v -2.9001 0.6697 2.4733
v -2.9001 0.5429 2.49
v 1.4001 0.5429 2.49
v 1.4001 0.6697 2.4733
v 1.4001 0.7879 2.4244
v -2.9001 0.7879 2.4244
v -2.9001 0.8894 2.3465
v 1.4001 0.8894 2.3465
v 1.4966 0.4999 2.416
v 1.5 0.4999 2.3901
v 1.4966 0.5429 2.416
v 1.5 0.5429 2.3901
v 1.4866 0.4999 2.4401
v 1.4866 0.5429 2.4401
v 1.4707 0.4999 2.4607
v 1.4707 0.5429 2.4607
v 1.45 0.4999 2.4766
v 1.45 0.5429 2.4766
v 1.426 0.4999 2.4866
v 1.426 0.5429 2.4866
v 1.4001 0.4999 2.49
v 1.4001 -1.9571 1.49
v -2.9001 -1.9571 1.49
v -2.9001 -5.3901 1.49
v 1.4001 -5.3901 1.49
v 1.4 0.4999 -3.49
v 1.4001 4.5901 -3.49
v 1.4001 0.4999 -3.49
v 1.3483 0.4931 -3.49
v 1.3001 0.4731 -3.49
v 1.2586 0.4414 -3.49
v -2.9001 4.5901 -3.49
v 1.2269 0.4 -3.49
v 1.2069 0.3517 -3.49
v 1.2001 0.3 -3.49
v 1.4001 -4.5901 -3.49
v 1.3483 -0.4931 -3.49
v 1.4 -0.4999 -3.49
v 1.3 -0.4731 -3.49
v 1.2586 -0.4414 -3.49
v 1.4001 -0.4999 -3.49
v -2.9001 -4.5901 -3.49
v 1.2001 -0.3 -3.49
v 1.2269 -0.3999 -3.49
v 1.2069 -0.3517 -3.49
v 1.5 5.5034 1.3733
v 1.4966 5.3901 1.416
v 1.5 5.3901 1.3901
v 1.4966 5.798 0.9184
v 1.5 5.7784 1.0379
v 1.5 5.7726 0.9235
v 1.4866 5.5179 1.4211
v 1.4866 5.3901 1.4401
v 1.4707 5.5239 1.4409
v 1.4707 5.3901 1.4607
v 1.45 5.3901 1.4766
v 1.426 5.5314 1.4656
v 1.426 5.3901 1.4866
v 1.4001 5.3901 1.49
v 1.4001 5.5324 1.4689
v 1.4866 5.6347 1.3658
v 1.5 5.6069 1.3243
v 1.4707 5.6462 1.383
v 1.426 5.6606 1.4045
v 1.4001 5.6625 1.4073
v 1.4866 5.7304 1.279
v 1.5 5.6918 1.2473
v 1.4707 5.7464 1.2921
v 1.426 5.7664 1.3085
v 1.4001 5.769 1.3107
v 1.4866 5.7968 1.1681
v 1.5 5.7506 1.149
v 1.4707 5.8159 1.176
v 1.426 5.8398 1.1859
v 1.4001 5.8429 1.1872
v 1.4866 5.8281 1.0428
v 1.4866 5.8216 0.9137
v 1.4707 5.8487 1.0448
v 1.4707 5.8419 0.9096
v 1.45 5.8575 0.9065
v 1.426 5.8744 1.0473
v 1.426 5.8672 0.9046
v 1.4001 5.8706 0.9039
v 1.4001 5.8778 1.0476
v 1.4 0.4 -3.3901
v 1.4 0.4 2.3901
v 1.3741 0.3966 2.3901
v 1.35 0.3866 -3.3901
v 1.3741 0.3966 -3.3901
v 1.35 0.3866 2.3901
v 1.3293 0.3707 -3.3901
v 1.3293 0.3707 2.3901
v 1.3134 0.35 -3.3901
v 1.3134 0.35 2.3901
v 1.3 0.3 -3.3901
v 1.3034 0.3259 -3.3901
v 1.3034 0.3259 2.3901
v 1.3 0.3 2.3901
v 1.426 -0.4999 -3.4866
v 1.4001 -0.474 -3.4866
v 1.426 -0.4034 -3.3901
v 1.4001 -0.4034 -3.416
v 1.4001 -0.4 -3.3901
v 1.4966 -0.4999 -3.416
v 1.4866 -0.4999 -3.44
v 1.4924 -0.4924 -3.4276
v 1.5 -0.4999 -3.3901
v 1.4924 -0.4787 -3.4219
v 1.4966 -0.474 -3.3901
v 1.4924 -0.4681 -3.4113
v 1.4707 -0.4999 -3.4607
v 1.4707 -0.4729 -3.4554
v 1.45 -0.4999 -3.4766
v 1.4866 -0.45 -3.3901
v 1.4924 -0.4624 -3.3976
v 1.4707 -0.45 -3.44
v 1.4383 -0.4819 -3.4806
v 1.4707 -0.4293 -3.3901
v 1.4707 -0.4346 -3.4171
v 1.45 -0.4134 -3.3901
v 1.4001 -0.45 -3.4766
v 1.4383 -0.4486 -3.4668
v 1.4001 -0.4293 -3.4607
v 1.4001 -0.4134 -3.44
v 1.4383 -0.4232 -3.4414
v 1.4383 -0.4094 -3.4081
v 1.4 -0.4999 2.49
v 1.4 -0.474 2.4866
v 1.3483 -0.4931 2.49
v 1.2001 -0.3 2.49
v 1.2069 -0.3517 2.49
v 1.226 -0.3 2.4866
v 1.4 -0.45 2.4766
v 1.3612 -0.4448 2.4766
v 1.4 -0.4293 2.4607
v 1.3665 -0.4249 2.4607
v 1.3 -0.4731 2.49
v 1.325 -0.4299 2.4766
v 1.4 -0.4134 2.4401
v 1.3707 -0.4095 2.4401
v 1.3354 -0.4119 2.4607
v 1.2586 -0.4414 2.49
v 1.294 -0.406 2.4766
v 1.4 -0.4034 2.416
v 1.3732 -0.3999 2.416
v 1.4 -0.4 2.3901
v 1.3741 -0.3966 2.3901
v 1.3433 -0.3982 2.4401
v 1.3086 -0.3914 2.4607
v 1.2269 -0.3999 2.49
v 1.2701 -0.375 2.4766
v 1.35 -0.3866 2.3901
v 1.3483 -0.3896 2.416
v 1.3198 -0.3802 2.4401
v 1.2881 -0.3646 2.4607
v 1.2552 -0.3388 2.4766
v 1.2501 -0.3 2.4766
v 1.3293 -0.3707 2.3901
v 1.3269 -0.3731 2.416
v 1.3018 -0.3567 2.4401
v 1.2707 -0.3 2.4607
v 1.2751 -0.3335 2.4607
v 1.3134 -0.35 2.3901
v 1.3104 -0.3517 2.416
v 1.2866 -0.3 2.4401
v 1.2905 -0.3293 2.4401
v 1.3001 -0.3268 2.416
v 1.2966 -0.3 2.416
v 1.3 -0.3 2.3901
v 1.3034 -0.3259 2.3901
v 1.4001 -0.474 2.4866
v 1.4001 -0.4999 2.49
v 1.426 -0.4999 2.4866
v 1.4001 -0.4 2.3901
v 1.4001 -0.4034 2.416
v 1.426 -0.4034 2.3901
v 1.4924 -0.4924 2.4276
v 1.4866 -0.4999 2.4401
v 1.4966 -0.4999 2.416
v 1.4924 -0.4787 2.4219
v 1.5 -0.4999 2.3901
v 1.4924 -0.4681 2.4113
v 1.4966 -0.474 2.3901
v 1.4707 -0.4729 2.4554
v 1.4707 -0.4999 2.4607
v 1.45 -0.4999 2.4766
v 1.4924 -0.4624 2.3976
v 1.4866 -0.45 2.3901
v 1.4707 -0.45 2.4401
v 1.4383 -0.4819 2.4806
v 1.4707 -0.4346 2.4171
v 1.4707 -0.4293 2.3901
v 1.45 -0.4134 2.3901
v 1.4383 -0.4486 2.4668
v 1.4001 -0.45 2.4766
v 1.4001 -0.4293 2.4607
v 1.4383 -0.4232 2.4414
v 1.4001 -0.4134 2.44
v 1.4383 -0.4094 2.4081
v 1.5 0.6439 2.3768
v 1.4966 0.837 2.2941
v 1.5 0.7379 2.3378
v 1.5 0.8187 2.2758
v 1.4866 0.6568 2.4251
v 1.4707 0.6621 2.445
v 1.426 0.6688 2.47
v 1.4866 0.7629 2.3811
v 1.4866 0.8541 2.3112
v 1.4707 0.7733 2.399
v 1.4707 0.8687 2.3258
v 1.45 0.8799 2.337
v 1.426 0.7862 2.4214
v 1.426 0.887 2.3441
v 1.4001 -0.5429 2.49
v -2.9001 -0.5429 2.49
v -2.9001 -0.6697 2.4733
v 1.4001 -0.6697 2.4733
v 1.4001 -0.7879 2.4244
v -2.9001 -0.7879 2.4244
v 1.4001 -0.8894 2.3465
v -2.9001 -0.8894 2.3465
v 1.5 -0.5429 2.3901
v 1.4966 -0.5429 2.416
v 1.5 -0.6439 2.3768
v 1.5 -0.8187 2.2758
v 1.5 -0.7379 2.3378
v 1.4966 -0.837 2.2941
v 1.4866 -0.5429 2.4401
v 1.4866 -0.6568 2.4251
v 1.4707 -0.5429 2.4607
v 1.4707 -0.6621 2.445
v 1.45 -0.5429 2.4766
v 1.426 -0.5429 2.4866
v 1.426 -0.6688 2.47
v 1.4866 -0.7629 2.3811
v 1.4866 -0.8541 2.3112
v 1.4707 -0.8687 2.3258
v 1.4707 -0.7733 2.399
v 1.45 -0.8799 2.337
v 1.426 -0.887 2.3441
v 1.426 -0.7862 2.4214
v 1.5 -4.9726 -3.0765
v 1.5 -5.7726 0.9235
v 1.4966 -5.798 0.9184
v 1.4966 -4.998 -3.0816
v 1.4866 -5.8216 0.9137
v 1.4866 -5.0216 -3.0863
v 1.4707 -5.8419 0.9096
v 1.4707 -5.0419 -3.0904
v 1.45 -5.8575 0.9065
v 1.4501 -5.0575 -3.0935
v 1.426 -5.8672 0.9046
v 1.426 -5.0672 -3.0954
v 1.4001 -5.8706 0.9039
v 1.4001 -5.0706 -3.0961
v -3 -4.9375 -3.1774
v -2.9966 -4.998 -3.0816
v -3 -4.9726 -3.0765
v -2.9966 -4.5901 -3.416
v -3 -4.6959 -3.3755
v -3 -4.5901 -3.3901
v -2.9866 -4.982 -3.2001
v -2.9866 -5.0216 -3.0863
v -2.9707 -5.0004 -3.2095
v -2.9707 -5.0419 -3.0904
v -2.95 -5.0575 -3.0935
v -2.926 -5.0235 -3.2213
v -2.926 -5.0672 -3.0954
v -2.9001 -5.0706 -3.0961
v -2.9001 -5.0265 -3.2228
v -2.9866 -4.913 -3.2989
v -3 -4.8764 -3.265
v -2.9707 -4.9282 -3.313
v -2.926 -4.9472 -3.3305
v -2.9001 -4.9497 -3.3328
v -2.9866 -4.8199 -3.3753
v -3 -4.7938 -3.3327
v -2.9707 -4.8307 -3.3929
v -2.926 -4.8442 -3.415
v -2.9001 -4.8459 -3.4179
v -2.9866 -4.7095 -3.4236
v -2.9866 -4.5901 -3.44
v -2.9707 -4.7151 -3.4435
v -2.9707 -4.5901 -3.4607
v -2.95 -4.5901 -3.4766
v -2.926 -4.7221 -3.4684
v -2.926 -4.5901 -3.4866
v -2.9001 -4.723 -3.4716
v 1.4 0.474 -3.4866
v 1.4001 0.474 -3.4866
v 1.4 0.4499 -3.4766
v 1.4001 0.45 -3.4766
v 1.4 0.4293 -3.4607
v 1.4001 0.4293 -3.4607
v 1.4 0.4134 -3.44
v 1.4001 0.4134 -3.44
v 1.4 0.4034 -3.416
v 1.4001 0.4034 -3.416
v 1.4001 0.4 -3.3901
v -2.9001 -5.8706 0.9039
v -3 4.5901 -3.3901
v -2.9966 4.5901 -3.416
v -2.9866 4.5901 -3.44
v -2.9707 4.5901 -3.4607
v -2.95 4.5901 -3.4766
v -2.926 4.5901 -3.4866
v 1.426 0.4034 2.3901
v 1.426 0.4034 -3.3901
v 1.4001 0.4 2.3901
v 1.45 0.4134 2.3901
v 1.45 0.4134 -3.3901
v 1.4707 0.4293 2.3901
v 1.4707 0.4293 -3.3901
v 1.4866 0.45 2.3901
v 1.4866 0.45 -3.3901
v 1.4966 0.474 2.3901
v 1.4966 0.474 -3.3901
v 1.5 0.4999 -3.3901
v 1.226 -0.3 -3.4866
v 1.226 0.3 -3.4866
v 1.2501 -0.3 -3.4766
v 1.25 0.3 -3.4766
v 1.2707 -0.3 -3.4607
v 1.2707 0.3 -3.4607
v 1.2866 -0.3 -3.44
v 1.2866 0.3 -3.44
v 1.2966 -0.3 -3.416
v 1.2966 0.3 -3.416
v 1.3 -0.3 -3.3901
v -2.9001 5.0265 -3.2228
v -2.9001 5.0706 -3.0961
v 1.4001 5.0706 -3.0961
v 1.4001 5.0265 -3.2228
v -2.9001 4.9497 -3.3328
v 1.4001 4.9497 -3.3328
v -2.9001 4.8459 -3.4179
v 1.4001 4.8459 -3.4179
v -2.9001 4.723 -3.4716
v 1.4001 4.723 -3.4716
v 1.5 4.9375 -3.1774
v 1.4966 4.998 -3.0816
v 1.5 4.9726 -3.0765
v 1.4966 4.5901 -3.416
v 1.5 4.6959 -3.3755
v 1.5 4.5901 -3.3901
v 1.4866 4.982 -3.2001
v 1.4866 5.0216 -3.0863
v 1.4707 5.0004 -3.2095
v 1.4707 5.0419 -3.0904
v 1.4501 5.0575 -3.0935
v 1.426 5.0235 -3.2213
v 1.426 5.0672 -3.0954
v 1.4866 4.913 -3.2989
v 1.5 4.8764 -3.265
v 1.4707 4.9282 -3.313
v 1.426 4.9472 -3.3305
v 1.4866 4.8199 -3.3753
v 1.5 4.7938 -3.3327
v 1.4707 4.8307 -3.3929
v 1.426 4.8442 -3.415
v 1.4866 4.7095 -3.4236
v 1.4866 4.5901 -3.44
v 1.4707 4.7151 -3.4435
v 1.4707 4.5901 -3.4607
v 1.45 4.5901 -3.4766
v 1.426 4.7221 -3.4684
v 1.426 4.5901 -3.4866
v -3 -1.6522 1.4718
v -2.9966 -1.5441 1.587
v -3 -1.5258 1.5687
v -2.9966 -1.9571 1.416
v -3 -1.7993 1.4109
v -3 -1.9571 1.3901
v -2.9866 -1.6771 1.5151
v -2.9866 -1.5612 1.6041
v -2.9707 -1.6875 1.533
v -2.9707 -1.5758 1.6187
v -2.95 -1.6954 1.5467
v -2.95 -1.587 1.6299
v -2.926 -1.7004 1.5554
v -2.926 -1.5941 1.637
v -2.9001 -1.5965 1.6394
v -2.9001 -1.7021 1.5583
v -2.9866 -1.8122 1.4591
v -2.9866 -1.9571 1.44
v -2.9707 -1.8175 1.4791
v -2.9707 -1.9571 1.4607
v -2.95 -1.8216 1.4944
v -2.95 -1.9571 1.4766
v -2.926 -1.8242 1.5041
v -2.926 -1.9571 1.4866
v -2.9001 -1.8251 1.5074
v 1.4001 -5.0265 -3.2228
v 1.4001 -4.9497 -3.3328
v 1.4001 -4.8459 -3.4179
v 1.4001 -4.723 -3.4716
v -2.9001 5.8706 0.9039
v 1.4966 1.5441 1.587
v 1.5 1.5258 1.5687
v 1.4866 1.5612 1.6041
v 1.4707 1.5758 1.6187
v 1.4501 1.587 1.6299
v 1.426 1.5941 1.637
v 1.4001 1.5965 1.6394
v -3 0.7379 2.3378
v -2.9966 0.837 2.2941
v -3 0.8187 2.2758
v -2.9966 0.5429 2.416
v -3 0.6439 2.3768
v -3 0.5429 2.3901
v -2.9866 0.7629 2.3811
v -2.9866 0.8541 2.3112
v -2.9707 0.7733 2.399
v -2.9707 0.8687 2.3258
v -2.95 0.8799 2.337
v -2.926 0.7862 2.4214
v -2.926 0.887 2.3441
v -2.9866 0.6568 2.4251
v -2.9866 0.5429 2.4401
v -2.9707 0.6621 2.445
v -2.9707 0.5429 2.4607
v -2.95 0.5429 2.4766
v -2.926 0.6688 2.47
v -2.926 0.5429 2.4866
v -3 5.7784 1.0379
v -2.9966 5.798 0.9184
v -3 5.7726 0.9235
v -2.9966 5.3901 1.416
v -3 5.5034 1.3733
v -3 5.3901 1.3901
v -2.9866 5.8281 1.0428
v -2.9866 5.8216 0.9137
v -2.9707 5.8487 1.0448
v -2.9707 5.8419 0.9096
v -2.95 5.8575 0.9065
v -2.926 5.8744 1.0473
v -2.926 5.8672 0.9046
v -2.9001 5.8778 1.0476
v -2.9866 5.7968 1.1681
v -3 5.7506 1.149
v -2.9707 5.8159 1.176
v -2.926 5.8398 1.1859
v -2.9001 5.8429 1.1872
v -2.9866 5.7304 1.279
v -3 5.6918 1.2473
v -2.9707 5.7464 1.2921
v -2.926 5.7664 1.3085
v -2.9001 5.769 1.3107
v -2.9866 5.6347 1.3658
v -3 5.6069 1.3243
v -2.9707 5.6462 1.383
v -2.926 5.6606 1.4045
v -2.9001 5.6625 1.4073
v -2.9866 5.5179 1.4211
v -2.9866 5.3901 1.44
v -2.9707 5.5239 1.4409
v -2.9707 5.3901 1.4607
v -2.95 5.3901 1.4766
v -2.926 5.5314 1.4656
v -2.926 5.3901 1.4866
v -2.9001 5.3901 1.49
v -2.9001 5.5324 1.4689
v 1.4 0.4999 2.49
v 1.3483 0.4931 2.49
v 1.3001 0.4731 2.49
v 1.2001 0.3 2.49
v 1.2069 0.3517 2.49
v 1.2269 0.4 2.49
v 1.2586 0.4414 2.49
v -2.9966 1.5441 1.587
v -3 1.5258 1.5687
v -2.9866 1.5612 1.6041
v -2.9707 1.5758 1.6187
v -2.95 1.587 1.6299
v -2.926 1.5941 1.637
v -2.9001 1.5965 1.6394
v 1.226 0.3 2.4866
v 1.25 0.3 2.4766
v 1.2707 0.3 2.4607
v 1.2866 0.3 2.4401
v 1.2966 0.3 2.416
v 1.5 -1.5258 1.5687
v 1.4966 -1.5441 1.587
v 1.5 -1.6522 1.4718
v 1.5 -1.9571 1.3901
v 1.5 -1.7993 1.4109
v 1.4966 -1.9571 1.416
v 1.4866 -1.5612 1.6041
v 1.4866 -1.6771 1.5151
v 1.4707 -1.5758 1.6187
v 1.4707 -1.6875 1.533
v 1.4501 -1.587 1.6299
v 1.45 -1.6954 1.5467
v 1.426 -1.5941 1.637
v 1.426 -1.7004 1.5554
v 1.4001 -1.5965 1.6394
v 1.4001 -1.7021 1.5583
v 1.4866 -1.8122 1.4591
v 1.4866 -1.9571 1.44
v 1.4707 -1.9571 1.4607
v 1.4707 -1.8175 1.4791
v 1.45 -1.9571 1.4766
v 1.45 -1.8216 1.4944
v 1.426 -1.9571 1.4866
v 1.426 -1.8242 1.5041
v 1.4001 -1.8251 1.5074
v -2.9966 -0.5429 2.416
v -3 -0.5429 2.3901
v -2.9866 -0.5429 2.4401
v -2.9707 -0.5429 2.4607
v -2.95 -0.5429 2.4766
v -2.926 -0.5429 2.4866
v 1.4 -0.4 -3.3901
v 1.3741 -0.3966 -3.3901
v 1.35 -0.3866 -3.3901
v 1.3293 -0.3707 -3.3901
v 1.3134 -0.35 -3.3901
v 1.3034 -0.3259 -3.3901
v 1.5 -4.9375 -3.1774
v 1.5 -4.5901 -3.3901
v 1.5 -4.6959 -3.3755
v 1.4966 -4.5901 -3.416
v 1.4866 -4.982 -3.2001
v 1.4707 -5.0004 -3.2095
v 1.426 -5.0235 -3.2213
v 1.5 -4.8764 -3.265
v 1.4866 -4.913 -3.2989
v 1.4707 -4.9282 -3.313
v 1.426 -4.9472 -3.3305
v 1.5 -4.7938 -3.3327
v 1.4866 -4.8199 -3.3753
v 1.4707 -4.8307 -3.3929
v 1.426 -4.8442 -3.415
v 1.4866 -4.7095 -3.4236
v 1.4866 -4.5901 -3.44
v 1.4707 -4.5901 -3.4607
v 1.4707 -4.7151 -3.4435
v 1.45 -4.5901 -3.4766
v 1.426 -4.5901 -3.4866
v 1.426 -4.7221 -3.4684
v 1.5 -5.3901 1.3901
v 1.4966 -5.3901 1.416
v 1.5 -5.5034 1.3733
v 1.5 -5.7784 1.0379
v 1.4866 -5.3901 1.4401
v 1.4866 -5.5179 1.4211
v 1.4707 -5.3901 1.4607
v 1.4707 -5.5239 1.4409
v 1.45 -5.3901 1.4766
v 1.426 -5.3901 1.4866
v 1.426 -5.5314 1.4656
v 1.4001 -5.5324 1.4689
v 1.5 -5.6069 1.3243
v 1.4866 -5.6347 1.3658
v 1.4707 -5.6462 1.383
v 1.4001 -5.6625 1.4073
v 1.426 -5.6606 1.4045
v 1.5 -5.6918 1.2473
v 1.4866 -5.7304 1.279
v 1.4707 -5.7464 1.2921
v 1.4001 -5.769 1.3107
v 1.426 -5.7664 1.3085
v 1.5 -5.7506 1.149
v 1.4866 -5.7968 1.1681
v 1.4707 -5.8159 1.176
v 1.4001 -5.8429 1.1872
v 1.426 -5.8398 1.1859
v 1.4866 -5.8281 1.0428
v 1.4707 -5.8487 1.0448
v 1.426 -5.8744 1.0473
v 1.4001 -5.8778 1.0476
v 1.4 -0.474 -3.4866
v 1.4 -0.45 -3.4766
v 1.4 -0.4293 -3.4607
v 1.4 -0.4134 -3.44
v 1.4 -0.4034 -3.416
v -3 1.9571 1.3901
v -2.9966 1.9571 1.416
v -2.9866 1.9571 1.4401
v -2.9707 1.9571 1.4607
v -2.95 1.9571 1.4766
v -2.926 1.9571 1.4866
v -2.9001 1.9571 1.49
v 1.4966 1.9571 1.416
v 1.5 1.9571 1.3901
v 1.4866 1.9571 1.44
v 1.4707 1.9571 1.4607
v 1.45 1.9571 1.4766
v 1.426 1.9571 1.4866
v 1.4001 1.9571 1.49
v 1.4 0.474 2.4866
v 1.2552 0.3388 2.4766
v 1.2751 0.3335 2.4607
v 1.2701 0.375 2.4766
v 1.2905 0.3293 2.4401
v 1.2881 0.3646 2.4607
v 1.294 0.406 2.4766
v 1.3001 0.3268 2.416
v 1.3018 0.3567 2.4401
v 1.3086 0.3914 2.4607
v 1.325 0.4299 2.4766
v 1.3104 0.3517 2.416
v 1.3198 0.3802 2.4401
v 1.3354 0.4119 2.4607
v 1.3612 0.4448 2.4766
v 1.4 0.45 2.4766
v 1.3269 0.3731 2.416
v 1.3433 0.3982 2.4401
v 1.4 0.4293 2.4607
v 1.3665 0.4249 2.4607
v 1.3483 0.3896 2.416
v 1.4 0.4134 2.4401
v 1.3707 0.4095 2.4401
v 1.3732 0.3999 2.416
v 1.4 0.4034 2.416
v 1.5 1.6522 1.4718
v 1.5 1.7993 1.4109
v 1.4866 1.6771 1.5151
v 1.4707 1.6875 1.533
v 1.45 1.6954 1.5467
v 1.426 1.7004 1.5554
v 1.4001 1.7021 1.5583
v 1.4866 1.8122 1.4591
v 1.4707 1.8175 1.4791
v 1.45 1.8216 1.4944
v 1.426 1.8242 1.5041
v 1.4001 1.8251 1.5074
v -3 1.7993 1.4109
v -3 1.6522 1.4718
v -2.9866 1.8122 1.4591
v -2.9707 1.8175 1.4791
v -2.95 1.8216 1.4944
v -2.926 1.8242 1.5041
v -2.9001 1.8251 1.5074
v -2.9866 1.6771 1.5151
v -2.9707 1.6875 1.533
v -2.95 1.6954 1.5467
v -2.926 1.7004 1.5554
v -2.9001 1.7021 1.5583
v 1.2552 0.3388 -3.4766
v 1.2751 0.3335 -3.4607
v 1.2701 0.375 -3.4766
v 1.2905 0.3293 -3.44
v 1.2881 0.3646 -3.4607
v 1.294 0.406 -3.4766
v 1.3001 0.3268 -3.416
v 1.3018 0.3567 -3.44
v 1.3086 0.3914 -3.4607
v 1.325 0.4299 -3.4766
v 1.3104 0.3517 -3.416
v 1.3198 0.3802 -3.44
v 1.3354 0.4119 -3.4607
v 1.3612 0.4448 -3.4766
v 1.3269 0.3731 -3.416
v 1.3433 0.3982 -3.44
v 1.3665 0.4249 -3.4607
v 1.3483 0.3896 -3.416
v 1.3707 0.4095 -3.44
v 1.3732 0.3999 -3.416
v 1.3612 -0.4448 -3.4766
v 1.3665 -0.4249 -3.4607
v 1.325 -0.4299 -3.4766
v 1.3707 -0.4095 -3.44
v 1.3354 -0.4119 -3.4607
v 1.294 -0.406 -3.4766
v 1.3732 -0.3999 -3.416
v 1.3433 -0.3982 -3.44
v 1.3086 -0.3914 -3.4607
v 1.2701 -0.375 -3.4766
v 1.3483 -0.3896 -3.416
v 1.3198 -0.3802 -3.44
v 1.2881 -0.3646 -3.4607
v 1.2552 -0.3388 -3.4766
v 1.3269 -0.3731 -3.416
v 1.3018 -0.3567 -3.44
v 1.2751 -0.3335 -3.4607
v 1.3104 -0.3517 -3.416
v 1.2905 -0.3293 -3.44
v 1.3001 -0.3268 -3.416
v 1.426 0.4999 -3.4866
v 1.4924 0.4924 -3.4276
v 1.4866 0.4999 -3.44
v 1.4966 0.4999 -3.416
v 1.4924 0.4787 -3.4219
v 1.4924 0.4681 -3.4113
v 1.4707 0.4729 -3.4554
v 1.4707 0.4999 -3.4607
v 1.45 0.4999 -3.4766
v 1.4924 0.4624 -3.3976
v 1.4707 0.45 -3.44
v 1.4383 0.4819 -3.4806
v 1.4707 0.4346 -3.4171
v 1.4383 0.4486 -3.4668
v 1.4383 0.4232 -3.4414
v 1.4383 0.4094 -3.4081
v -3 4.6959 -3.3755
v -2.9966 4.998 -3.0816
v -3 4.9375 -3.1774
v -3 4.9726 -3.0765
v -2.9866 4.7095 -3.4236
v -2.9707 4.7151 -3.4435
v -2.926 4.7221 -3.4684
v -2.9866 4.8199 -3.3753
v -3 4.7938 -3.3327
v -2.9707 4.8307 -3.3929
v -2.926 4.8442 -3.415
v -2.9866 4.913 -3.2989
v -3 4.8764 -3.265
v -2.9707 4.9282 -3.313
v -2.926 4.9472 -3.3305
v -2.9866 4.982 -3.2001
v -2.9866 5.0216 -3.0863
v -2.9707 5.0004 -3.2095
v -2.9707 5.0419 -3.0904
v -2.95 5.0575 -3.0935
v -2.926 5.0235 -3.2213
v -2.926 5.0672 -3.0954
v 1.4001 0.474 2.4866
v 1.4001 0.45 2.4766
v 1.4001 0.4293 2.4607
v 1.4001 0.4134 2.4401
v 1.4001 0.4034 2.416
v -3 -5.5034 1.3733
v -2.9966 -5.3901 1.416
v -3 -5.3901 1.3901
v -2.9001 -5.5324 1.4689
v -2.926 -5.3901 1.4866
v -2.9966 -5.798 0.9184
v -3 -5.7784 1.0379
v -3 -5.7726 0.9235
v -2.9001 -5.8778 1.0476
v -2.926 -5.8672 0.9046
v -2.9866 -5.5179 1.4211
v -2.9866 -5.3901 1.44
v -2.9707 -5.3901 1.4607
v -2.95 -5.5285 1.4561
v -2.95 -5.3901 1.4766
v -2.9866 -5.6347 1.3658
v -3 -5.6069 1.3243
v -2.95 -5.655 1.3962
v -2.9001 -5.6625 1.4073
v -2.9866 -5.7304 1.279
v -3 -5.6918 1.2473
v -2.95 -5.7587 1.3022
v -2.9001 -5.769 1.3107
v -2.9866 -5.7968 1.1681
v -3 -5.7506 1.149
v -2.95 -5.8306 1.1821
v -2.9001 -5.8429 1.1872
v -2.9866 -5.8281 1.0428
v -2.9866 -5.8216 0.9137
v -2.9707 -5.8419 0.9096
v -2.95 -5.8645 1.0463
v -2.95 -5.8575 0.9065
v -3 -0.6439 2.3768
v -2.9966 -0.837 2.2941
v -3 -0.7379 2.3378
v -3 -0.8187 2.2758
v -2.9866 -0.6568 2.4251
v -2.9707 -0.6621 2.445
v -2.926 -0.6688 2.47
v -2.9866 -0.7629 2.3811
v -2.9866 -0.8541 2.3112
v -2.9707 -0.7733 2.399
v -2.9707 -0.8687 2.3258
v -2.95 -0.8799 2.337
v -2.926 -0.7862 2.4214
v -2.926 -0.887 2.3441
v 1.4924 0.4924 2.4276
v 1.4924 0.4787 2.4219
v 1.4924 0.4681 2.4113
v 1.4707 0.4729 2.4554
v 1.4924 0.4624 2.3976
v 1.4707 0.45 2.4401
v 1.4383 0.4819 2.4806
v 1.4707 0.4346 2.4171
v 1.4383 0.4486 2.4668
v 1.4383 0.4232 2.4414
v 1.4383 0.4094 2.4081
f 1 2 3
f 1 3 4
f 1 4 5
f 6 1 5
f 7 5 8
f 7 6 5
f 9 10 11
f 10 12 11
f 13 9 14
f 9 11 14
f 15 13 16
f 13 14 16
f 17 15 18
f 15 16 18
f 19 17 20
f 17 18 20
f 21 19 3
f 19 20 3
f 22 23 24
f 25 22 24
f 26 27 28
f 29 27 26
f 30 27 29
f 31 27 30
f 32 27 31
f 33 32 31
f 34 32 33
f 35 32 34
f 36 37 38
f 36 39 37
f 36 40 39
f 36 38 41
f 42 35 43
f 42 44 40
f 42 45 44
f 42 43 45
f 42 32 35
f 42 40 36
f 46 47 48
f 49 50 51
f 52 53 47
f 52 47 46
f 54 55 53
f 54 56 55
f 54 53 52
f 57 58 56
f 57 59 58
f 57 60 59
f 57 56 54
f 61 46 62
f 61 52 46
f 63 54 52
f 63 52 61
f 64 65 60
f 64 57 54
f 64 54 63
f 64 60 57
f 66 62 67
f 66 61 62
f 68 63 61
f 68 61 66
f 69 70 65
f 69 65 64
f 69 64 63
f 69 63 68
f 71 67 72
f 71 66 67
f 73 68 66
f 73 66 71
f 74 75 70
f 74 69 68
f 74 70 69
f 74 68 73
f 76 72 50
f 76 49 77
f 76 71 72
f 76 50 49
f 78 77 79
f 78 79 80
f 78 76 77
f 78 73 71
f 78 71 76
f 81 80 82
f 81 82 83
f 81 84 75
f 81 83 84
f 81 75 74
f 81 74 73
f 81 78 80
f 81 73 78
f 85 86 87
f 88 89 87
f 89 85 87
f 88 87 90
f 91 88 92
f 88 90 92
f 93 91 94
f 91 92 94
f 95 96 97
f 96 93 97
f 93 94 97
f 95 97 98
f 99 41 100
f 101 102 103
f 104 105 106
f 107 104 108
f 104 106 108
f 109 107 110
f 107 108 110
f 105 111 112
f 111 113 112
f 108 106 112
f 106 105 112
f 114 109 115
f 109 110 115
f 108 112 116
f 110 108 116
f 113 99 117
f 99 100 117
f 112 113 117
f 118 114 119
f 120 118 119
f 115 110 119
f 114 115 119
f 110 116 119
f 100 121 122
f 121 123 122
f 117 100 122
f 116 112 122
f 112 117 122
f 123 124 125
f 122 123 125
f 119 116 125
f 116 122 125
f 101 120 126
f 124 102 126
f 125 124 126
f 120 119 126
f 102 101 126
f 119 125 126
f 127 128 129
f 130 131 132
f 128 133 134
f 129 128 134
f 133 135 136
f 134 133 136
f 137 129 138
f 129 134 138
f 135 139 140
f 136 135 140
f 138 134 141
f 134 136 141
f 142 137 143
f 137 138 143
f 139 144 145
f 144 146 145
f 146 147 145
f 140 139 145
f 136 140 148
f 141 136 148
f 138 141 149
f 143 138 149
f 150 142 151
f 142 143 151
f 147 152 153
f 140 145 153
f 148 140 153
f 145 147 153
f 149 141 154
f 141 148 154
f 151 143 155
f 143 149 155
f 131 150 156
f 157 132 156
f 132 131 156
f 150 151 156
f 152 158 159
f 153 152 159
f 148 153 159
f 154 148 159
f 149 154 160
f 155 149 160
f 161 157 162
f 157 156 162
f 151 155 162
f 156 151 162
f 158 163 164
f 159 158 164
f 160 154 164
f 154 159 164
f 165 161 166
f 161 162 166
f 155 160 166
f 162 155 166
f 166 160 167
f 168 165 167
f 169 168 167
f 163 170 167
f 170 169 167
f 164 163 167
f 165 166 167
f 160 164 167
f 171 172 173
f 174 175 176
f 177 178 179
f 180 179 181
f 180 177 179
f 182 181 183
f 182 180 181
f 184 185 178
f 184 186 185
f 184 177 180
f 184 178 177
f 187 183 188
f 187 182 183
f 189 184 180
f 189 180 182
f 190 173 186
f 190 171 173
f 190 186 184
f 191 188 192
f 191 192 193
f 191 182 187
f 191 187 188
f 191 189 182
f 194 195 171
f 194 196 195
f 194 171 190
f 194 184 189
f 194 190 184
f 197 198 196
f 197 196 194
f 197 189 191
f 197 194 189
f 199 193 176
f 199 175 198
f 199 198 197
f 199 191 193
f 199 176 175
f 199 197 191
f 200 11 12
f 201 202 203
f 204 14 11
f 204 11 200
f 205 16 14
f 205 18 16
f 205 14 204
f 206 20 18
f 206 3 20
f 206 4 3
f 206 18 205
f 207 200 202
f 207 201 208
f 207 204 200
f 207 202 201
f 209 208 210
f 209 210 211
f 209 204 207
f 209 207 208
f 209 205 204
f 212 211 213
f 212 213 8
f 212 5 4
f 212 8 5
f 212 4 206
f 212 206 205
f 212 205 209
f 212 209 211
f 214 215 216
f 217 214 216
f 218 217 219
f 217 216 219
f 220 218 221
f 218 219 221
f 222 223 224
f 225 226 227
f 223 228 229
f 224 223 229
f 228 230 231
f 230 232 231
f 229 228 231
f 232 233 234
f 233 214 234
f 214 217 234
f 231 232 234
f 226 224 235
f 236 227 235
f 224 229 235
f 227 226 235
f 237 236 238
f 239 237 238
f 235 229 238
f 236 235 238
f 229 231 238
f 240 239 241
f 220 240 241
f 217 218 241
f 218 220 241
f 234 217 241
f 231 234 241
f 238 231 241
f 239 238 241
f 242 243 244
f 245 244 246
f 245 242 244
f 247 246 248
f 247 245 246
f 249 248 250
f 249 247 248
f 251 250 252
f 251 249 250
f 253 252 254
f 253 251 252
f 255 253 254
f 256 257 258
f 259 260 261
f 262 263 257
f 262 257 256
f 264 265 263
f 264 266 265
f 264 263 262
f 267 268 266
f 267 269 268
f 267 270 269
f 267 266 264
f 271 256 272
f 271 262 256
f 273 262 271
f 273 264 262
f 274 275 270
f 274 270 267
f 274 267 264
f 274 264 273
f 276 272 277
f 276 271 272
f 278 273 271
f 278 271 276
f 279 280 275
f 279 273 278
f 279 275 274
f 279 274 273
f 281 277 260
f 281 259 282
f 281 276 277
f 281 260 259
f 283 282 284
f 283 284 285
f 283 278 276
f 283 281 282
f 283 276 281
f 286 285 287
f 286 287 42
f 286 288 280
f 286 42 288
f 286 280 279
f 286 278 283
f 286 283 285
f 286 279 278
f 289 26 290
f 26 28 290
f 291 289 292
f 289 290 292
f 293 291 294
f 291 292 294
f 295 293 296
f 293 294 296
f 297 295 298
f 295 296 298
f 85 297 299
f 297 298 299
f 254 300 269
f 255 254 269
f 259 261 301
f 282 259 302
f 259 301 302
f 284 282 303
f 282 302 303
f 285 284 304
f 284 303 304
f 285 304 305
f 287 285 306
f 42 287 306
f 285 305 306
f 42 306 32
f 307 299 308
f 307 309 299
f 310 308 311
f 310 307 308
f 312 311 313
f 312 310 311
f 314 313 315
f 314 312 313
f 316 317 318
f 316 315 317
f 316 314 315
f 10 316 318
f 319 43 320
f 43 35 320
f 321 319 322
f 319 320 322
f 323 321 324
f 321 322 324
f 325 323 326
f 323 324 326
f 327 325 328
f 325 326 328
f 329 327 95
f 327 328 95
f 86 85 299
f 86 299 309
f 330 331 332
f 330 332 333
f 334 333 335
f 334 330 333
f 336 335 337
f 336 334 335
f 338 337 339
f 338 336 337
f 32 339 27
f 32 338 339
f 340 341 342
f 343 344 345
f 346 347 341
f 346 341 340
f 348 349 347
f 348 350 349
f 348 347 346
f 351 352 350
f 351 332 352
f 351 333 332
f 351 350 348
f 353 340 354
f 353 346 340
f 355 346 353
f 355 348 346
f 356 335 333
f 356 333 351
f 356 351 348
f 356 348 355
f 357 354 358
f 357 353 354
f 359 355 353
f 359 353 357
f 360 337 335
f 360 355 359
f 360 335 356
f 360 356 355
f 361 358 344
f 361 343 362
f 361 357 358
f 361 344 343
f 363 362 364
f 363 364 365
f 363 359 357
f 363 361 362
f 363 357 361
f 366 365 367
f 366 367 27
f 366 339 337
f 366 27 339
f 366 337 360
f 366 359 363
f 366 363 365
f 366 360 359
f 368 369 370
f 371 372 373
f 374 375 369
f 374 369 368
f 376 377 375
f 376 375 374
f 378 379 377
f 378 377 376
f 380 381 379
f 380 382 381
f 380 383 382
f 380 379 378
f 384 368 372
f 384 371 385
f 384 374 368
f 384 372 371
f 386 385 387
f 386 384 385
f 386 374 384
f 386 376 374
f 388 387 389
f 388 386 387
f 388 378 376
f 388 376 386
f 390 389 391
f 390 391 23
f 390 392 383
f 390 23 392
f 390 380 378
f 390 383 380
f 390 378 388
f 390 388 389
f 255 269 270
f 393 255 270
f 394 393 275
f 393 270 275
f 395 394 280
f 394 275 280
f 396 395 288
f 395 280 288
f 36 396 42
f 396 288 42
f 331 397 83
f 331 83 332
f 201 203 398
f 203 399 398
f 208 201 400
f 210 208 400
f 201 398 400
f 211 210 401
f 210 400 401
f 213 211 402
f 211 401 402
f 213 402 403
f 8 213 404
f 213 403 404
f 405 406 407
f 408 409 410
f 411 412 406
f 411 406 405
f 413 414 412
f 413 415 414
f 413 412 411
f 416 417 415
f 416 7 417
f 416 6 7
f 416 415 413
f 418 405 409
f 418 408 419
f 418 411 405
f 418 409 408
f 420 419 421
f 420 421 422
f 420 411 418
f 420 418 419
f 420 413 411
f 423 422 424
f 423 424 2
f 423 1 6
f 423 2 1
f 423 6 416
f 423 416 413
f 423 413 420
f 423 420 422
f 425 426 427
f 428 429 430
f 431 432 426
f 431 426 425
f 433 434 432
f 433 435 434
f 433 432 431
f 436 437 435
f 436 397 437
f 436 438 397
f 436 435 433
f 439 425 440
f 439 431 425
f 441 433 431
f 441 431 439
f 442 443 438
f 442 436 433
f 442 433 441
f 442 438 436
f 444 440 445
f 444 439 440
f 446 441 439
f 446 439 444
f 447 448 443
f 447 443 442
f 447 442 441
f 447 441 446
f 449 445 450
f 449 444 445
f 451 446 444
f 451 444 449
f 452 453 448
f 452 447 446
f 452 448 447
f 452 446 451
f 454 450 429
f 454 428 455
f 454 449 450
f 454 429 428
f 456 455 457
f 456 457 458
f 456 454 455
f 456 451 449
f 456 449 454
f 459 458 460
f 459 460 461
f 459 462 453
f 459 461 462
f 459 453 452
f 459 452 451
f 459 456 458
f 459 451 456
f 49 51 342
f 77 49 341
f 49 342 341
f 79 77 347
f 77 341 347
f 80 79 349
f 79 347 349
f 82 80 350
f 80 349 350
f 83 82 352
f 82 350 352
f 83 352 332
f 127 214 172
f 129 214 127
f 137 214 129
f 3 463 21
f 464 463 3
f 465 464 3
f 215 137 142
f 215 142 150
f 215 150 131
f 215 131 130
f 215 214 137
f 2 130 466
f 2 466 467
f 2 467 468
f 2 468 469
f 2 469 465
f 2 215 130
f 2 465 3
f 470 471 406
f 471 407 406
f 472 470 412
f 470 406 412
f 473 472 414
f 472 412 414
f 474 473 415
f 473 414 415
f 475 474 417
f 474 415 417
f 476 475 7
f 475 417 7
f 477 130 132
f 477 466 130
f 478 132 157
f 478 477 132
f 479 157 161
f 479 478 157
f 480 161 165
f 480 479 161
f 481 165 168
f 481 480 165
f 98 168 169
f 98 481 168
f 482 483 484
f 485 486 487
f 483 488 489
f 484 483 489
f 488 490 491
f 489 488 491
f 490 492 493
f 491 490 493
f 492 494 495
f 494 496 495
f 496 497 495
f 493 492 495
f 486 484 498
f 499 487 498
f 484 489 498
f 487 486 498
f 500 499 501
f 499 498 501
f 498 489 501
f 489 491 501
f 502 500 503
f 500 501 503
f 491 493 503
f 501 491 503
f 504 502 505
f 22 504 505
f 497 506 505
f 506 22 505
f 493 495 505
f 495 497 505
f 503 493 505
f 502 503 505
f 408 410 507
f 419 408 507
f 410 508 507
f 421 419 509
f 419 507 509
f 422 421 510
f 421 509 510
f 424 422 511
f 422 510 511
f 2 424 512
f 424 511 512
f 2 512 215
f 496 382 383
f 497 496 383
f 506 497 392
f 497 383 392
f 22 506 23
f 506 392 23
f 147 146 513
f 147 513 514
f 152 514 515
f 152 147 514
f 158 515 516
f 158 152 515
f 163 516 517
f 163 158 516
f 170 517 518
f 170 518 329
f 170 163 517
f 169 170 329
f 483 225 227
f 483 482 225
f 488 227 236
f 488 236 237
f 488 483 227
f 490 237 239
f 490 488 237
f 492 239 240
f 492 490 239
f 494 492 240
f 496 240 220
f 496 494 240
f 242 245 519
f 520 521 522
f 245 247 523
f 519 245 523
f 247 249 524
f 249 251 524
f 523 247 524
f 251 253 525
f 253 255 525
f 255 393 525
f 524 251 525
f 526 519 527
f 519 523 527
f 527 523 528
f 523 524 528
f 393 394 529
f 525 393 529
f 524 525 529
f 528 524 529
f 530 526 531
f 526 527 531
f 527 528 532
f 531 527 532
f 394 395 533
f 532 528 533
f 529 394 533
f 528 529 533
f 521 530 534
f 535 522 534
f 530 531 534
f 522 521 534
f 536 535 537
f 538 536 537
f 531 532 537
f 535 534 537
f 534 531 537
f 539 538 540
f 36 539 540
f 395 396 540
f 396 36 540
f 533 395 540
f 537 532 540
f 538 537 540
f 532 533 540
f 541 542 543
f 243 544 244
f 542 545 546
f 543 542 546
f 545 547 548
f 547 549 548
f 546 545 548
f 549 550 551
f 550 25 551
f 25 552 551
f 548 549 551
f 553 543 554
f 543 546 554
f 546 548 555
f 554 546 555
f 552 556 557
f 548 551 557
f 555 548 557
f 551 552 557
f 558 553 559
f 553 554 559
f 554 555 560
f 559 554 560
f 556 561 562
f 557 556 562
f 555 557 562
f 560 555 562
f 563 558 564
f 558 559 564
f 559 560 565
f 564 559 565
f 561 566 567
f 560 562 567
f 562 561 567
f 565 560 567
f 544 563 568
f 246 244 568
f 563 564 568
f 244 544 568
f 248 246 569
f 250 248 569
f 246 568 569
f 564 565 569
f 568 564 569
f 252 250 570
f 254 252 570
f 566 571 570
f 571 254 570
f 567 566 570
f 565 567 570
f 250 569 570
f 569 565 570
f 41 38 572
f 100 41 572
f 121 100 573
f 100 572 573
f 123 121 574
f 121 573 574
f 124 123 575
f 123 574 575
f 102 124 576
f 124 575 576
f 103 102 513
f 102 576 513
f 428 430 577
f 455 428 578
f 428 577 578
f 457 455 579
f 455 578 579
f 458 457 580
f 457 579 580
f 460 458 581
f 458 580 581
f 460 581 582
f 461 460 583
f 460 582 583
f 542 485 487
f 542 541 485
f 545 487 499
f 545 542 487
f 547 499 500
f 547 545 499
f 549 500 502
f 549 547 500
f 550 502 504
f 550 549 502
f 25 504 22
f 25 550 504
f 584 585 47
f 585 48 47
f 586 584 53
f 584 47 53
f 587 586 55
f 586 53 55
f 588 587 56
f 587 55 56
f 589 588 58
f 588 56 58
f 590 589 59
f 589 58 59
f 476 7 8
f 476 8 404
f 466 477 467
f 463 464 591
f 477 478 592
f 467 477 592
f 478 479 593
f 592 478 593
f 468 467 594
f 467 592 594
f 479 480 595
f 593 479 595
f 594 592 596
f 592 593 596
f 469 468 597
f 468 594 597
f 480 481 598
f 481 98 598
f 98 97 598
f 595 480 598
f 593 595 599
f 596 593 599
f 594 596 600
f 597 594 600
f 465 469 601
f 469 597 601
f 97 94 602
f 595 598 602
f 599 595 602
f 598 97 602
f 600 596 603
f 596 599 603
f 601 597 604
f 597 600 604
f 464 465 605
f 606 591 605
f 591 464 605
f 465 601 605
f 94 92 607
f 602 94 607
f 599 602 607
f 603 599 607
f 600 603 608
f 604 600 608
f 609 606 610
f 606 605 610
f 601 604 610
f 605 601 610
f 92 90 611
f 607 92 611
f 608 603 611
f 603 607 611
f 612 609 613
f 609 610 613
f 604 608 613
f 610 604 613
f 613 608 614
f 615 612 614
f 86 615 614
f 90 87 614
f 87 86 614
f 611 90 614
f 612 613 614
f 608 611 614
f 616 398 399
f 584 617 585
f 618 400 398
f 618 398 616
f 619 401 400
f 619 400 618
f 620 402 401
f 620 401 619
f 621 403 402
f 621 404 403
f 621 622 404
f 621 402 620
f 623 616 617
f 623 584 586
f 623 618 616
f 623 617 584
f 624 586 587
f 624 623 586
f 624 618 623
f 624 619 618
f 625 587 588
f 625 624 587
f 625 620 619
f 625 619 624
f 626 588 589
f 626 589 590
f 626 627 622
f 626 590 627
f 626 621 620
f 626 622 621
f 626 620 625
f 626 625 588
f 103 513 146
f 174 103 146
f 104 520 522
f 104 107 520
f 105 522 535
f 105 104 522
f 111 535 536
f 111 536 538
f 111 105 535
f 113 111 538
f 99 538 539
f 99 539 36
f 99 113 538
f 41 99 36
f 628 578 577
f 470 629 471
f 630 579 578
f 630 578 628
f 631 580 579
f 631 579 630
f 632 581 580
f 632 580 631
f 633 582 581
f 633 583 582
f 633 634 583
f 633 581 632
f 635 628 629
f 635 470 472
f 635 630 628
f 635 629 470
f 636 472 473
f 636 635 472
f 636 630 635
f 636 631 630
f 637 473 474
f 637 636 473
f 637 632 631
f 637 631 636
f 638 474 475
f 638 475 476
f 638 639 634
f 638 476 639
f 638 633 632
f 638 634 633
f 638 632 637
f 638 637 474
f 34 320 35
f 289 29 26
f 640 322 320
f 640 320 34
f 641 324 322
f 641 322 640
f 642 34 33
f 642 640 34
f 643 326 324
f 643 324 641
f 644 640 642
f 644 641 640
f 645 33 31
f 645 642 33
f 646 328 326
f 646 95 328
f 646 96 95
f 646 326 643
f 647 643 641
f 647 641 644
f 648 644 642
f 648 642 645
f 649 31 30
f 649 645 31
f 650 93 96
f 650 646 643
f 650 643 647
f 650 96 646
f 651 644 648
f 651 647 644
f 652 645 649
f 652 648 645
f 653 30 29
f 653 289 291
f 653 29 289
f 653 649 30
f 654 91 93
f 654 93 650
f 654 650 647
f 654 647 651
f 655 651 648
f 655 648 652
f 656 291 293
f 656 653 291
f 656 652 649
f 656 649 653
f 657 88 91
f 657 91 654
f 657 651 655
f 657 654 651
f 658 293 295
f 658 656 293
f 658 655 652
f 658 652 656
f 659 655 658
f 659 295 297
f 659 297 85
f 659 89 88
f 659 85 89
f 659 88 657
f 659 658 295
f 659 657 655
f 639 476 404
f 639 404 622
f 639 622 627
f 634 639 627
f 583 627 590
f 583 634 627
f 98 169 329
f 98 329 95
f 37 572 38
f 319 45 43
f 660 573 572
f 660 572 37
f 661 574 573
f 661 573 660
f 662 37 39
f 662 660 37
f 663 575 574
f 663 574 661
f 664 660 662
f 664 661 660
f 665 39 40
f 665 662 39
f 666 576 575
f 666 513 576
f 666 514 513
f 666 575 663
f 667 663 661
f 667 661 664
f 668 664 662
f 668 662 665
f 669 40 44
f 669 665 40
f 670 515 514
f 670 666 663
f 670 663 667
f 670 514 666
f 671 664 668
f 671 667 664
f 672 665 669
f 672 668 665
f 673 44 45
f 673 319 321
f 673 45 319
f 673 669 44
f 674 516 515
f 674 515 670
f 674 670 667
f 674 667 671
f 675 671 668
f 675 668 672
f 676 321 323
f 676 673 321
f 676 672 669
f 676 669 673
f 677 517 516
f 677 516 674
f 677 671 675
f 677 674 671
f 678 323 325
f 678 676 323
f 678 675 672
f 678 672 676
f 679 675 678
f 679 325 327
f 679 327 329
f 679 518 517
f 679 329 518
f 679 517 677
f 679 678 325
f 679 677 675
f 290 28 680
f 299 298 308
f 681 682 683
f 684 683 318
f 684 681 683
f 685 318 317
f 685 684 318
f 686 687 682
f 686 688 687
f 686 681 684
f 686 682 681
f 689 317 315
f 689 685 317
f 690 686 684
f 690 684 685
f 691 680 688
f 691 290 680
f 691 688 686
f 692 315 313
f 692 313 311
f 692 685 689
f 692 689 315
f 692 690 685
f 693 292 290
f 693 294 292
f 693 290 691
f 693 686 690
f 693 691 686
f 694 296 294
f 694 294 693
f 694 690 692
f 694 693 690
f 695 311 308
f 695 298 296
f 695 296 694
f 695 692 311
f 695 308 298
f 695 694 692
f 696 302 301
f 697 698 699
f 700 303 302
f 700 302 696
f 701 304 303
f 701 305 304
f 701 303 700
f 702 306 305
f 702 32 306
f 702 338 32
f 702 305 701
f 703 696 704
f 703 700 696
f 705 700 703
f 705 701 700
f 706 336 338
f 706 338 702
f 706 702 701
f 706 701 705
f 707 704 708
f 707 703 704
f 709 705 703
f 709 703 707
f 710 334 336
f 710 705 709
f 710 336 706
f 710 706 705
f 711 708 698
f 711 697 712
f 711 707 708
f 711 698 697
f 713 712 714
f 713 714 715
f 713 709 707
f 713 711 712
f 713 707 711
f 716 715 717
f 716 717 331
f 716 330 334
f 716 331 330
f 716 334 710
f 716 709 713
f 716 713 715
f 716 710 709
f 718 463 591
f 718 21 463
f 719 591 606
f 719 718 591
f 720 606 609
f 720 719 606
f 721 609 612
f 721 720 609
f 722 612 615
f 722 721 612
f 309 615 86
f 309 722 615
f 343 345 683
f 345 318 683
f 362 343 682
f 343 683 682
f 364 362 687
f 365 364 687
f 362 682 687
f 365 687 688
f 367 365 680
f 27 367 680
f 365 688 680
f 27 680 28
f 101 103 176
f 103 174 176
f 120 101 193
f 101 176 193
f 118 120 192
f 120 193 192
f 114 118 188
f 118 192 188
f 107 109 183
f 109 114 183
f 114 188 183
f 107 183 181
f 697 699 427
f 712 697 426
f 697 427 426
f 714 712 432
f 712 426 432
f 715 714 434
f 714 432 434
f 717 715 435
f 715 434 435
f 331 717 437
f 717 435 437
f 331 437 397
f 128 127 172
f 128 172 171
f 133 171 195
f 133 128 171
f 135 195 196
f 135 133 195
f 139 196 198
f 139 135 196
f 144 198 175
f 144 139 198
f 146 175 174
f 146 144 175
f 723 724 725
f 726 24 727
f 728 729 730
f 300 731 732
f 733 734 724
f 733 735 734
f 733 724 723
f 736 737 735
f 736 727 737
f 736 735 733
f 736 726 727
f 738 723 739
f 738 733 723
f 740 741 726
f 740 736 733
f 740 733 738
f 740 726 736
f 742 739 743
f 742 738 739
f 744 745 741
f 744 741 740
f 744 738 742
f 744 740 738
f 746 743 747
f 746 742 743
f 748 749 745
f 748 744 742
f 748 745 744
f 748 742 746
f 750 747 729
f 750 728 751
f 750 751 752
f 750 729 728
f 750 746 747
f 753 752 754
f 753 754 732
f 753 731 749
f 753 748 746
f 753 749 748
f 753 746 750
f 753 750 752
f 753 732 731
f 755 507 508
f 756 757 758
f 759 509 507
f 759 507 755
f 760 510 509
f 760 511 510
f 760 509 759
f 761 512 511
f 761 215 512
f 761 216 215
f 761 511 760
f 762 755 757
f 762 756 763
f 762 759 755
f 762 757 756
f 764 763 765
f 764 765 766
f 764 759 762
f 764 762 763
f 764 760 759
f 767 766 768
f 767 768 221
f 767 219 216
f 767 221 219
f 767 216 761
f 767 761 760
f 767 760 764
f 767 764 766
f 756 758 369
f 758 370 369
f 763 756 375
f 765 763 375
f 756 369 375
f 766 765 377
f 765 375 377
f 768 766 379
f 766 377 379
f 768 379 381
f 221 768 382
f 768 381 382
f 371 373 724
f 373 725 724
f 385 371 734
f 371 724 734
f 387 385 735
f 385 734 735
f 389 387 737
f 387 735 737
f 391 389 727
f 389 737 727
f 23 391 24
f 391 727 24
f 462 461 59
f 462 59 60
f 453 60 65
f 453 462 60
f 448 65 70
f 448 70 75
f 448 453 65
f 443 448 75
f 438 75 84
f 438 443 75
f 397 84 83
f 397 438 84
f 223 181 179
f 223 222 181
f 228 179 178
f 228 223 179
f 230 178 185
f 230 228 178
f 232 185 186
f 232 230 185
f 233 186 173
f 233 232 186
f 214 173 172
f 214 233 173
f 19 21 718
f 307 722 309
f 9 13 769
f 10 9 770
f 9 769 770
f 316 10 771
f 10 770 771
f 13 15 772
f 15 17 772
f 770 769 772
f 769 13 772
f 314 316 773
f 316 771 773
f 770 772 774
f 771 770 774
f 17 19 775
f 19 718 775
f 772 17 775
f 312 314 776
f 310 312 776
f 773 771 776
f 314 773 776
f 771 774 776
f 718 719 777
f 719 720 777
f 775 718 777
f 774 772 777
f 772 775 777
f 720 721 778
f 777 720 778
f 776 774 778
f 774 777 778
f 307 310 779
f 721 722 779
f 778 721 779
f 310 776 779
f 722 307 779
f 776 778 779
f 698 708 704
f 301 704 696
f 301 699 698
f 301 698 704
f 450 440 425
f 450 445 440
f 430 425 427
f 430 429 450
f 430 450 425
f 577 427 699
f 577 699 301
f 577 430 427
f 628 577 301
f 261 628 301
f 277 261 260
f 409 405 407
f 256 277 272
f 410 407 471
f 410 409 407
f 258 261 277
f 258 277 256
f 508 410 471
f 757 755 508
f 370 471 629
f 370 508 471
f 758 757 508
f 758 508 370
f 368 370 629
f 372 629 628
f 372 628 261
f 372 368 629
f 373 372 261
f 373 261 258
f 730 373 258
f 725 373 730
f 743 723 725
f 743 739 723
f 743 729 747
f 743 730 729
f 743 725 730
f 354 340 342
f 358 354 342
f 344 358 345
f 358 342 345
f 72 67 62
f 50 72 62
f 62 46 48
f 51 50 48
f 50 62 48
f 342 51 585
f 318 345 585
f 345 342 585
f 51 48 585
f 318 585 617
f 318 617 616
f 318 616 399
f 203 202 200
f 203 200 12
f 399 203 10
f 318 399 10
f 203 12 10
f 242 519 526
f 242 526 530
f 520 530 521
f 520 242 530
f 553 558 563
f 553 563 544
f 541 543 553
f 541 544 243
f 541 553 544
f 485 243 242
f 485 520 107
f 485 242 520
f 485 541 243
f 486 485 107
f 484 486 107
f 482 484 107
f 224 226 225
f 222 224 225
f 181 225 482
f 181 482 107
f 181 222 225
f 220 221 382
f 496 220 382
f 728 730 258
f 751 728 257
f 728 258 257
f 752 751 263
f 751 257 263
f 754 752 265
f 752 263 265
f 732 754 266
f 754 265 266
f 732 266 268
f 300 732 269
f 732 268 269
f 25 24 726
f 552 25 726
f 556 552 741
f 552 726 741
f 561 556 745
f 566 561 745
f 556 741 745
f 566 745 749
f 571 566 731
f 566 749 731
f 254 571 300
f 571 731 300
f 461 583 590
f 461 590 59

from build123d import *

# Parameters (mm, degrees)
BOSS_EXTRUDE2_START      = -3
BOSS_EXTRUDE2_DEPTH      = 4.5
BOSS_EXTRUDE3_DEPTH      = 1.3
BOSS_EXTRUDE3_DEPTH_BACK = 3
SKETCH2_3_W              = 0.8
SKETCH2_3_H              = 5.98
FILLET1_R                = 0.1


with BuildPart() as part:
    # Sketch2 → Boss-Extrude2 (new body)
    with BuildSketch(Plane.YZ.offset(BOSS_EXTRUDE2_START)):
        with BuildLine():
            Line((-0.4, -3.49), (-0.4, 2.49))
            Line((-0.4, 2.49), (-0.542893219, 2.49))
            ThreePointArc((-0.542893219, 2.49), (-0.730408101, 2.452700971), (-0.889375542, 2.346482323))
            Line((-0.889375542, 2.346482323), (-1.596482323, 1.639375542))
            ThreePointArc((-1.596482323, 1.639375542), (-1.761938231, 1.528821438), (-1.957106781, 1.49))
            Line((-1.957106781, 1.49), (-5.390098049, 1.49))
            ThreePointArc((-5.390098049, 1.49), (-5.769035698, 1.310654564), (-5.87058258, 0.903903094))
            Line((-5.87058258, 0.903903094), (-5.07058258, -3.096096906))
            ThreePointArc((-5.07058258, -3.096096906), (-4.900752612, -3.378937649), (-4.590098049, -3.49))
            Line((-4.590098049, -3.49), (-0.4, -3.49))
        make_face()
    boss_extrude2 = extrude(amount=BOSS_EXTRUDE2_DEPTH)

    # Sketch2<3> → Boss-Extrude3 (add, two sides: drawn at the far end of the back side and taken through both)
    with BuildSketch(Plane.YZ.offset(-BOSS_EXTRUDE3_DEPTH_BACK)):
        with Locations((0, -0.5)):
            Rectangle(SKETCH2_3_W, SKETCH2_3_H)
    extrude(amount=BOSS_EXTRUDE3_DEPTH + BOSS_EXTRUDE3_DEPTH_BACK)

    # Mirror1: Boss-Extrude2 across plane
    add(boss_extrude2.mirror(Plane.ZX))

    # Fillet1
    fillet1_edges = [part.edges().sort_by_distance(p)[0] for p in [
        (1.3, -0.4, -0.5),
        (1.3, 0.4, -0.5),
    ]]
    fillet(fillet1_edges, radius=FILLET1_R)
    fillet1_2_edges = [part.edges().sort_by_distance(p)[0] for p in [
        (1.3, 0, -3.49),
        (1.3, 0, 2.49),
        (1.5, 5.769035698, 1.310654564),
        (1.5, 5.47058258, -1.096096906),
        (1.5, 4.900752612, -3.378937649),
        (1.5, 2.495049024, -3.49),
        (1.5, 0.4, -0.5),
        (1.5, 0.471446609, 2.49),
        (1.5, 0.730408101, 2.452700971),
        (1.5, 1.242928932, 1.992928932),
        (1.5, 1.761938231, 1.528821438),
        (1.5, 3.673602415, 1.49),
        (1.5, -1.761938231, 1.528821438),
        (1.5, -1.242928932, 1.992928932),
        (1.5, -0.730408101, 2.452700971),
        (1.5, -0.471446609, 2.49),
        (1.5, -0.4, -0.5),
        (1.5, -2.495049024, -3.49),
        (1.5, -4.900752612, -3.378937649),
        (1.5, -5.47058258, -1.096096906),
        (1.5, -5.769035698, 1.310654564),
        (1.5, -3.673602415, 1.49),
        (-3, -5.769035698, 1.310654564),
        (-3, -5.47058258, -1.096096906),
        (-3, -4.900752612, -3.378937649),
        (-3, 0, -3.49),
        (-3, 4.900752612, -3.378937649),
        (-3, 5.47058258, -1.096096906),
        (-3, 5.769035698, 1.310654564),
        (-3, 3.673602415, 1.49),
        (-3, 1.761938231, 1.528821438),
        (-3, 1.242928932, 1.992928932),
        (-3, 0.730408101, 2.452700971),
        (-3, 0, 2.49),
        (-3, -0.730408101, 2.452700971),
        (-3, -1.242928932, 1.992928932),
        (-3, -1.761938231, 1.528821438),
        (-3, -3.673602415, 1.49),
        (1.329289322, 0.370710678, 2.49),
        (1.329289322, -0.370710678, 2.49),
        (1.329289322, -0.370710678, -3.49),
        (1.329289322, 0.370710678, -3.49),
    ]]
    fillet(fillet1_2_edges, radius=FILLET1_R - 0.0001)  # a hair under: the kernel refuses the full size


solid = part.part
